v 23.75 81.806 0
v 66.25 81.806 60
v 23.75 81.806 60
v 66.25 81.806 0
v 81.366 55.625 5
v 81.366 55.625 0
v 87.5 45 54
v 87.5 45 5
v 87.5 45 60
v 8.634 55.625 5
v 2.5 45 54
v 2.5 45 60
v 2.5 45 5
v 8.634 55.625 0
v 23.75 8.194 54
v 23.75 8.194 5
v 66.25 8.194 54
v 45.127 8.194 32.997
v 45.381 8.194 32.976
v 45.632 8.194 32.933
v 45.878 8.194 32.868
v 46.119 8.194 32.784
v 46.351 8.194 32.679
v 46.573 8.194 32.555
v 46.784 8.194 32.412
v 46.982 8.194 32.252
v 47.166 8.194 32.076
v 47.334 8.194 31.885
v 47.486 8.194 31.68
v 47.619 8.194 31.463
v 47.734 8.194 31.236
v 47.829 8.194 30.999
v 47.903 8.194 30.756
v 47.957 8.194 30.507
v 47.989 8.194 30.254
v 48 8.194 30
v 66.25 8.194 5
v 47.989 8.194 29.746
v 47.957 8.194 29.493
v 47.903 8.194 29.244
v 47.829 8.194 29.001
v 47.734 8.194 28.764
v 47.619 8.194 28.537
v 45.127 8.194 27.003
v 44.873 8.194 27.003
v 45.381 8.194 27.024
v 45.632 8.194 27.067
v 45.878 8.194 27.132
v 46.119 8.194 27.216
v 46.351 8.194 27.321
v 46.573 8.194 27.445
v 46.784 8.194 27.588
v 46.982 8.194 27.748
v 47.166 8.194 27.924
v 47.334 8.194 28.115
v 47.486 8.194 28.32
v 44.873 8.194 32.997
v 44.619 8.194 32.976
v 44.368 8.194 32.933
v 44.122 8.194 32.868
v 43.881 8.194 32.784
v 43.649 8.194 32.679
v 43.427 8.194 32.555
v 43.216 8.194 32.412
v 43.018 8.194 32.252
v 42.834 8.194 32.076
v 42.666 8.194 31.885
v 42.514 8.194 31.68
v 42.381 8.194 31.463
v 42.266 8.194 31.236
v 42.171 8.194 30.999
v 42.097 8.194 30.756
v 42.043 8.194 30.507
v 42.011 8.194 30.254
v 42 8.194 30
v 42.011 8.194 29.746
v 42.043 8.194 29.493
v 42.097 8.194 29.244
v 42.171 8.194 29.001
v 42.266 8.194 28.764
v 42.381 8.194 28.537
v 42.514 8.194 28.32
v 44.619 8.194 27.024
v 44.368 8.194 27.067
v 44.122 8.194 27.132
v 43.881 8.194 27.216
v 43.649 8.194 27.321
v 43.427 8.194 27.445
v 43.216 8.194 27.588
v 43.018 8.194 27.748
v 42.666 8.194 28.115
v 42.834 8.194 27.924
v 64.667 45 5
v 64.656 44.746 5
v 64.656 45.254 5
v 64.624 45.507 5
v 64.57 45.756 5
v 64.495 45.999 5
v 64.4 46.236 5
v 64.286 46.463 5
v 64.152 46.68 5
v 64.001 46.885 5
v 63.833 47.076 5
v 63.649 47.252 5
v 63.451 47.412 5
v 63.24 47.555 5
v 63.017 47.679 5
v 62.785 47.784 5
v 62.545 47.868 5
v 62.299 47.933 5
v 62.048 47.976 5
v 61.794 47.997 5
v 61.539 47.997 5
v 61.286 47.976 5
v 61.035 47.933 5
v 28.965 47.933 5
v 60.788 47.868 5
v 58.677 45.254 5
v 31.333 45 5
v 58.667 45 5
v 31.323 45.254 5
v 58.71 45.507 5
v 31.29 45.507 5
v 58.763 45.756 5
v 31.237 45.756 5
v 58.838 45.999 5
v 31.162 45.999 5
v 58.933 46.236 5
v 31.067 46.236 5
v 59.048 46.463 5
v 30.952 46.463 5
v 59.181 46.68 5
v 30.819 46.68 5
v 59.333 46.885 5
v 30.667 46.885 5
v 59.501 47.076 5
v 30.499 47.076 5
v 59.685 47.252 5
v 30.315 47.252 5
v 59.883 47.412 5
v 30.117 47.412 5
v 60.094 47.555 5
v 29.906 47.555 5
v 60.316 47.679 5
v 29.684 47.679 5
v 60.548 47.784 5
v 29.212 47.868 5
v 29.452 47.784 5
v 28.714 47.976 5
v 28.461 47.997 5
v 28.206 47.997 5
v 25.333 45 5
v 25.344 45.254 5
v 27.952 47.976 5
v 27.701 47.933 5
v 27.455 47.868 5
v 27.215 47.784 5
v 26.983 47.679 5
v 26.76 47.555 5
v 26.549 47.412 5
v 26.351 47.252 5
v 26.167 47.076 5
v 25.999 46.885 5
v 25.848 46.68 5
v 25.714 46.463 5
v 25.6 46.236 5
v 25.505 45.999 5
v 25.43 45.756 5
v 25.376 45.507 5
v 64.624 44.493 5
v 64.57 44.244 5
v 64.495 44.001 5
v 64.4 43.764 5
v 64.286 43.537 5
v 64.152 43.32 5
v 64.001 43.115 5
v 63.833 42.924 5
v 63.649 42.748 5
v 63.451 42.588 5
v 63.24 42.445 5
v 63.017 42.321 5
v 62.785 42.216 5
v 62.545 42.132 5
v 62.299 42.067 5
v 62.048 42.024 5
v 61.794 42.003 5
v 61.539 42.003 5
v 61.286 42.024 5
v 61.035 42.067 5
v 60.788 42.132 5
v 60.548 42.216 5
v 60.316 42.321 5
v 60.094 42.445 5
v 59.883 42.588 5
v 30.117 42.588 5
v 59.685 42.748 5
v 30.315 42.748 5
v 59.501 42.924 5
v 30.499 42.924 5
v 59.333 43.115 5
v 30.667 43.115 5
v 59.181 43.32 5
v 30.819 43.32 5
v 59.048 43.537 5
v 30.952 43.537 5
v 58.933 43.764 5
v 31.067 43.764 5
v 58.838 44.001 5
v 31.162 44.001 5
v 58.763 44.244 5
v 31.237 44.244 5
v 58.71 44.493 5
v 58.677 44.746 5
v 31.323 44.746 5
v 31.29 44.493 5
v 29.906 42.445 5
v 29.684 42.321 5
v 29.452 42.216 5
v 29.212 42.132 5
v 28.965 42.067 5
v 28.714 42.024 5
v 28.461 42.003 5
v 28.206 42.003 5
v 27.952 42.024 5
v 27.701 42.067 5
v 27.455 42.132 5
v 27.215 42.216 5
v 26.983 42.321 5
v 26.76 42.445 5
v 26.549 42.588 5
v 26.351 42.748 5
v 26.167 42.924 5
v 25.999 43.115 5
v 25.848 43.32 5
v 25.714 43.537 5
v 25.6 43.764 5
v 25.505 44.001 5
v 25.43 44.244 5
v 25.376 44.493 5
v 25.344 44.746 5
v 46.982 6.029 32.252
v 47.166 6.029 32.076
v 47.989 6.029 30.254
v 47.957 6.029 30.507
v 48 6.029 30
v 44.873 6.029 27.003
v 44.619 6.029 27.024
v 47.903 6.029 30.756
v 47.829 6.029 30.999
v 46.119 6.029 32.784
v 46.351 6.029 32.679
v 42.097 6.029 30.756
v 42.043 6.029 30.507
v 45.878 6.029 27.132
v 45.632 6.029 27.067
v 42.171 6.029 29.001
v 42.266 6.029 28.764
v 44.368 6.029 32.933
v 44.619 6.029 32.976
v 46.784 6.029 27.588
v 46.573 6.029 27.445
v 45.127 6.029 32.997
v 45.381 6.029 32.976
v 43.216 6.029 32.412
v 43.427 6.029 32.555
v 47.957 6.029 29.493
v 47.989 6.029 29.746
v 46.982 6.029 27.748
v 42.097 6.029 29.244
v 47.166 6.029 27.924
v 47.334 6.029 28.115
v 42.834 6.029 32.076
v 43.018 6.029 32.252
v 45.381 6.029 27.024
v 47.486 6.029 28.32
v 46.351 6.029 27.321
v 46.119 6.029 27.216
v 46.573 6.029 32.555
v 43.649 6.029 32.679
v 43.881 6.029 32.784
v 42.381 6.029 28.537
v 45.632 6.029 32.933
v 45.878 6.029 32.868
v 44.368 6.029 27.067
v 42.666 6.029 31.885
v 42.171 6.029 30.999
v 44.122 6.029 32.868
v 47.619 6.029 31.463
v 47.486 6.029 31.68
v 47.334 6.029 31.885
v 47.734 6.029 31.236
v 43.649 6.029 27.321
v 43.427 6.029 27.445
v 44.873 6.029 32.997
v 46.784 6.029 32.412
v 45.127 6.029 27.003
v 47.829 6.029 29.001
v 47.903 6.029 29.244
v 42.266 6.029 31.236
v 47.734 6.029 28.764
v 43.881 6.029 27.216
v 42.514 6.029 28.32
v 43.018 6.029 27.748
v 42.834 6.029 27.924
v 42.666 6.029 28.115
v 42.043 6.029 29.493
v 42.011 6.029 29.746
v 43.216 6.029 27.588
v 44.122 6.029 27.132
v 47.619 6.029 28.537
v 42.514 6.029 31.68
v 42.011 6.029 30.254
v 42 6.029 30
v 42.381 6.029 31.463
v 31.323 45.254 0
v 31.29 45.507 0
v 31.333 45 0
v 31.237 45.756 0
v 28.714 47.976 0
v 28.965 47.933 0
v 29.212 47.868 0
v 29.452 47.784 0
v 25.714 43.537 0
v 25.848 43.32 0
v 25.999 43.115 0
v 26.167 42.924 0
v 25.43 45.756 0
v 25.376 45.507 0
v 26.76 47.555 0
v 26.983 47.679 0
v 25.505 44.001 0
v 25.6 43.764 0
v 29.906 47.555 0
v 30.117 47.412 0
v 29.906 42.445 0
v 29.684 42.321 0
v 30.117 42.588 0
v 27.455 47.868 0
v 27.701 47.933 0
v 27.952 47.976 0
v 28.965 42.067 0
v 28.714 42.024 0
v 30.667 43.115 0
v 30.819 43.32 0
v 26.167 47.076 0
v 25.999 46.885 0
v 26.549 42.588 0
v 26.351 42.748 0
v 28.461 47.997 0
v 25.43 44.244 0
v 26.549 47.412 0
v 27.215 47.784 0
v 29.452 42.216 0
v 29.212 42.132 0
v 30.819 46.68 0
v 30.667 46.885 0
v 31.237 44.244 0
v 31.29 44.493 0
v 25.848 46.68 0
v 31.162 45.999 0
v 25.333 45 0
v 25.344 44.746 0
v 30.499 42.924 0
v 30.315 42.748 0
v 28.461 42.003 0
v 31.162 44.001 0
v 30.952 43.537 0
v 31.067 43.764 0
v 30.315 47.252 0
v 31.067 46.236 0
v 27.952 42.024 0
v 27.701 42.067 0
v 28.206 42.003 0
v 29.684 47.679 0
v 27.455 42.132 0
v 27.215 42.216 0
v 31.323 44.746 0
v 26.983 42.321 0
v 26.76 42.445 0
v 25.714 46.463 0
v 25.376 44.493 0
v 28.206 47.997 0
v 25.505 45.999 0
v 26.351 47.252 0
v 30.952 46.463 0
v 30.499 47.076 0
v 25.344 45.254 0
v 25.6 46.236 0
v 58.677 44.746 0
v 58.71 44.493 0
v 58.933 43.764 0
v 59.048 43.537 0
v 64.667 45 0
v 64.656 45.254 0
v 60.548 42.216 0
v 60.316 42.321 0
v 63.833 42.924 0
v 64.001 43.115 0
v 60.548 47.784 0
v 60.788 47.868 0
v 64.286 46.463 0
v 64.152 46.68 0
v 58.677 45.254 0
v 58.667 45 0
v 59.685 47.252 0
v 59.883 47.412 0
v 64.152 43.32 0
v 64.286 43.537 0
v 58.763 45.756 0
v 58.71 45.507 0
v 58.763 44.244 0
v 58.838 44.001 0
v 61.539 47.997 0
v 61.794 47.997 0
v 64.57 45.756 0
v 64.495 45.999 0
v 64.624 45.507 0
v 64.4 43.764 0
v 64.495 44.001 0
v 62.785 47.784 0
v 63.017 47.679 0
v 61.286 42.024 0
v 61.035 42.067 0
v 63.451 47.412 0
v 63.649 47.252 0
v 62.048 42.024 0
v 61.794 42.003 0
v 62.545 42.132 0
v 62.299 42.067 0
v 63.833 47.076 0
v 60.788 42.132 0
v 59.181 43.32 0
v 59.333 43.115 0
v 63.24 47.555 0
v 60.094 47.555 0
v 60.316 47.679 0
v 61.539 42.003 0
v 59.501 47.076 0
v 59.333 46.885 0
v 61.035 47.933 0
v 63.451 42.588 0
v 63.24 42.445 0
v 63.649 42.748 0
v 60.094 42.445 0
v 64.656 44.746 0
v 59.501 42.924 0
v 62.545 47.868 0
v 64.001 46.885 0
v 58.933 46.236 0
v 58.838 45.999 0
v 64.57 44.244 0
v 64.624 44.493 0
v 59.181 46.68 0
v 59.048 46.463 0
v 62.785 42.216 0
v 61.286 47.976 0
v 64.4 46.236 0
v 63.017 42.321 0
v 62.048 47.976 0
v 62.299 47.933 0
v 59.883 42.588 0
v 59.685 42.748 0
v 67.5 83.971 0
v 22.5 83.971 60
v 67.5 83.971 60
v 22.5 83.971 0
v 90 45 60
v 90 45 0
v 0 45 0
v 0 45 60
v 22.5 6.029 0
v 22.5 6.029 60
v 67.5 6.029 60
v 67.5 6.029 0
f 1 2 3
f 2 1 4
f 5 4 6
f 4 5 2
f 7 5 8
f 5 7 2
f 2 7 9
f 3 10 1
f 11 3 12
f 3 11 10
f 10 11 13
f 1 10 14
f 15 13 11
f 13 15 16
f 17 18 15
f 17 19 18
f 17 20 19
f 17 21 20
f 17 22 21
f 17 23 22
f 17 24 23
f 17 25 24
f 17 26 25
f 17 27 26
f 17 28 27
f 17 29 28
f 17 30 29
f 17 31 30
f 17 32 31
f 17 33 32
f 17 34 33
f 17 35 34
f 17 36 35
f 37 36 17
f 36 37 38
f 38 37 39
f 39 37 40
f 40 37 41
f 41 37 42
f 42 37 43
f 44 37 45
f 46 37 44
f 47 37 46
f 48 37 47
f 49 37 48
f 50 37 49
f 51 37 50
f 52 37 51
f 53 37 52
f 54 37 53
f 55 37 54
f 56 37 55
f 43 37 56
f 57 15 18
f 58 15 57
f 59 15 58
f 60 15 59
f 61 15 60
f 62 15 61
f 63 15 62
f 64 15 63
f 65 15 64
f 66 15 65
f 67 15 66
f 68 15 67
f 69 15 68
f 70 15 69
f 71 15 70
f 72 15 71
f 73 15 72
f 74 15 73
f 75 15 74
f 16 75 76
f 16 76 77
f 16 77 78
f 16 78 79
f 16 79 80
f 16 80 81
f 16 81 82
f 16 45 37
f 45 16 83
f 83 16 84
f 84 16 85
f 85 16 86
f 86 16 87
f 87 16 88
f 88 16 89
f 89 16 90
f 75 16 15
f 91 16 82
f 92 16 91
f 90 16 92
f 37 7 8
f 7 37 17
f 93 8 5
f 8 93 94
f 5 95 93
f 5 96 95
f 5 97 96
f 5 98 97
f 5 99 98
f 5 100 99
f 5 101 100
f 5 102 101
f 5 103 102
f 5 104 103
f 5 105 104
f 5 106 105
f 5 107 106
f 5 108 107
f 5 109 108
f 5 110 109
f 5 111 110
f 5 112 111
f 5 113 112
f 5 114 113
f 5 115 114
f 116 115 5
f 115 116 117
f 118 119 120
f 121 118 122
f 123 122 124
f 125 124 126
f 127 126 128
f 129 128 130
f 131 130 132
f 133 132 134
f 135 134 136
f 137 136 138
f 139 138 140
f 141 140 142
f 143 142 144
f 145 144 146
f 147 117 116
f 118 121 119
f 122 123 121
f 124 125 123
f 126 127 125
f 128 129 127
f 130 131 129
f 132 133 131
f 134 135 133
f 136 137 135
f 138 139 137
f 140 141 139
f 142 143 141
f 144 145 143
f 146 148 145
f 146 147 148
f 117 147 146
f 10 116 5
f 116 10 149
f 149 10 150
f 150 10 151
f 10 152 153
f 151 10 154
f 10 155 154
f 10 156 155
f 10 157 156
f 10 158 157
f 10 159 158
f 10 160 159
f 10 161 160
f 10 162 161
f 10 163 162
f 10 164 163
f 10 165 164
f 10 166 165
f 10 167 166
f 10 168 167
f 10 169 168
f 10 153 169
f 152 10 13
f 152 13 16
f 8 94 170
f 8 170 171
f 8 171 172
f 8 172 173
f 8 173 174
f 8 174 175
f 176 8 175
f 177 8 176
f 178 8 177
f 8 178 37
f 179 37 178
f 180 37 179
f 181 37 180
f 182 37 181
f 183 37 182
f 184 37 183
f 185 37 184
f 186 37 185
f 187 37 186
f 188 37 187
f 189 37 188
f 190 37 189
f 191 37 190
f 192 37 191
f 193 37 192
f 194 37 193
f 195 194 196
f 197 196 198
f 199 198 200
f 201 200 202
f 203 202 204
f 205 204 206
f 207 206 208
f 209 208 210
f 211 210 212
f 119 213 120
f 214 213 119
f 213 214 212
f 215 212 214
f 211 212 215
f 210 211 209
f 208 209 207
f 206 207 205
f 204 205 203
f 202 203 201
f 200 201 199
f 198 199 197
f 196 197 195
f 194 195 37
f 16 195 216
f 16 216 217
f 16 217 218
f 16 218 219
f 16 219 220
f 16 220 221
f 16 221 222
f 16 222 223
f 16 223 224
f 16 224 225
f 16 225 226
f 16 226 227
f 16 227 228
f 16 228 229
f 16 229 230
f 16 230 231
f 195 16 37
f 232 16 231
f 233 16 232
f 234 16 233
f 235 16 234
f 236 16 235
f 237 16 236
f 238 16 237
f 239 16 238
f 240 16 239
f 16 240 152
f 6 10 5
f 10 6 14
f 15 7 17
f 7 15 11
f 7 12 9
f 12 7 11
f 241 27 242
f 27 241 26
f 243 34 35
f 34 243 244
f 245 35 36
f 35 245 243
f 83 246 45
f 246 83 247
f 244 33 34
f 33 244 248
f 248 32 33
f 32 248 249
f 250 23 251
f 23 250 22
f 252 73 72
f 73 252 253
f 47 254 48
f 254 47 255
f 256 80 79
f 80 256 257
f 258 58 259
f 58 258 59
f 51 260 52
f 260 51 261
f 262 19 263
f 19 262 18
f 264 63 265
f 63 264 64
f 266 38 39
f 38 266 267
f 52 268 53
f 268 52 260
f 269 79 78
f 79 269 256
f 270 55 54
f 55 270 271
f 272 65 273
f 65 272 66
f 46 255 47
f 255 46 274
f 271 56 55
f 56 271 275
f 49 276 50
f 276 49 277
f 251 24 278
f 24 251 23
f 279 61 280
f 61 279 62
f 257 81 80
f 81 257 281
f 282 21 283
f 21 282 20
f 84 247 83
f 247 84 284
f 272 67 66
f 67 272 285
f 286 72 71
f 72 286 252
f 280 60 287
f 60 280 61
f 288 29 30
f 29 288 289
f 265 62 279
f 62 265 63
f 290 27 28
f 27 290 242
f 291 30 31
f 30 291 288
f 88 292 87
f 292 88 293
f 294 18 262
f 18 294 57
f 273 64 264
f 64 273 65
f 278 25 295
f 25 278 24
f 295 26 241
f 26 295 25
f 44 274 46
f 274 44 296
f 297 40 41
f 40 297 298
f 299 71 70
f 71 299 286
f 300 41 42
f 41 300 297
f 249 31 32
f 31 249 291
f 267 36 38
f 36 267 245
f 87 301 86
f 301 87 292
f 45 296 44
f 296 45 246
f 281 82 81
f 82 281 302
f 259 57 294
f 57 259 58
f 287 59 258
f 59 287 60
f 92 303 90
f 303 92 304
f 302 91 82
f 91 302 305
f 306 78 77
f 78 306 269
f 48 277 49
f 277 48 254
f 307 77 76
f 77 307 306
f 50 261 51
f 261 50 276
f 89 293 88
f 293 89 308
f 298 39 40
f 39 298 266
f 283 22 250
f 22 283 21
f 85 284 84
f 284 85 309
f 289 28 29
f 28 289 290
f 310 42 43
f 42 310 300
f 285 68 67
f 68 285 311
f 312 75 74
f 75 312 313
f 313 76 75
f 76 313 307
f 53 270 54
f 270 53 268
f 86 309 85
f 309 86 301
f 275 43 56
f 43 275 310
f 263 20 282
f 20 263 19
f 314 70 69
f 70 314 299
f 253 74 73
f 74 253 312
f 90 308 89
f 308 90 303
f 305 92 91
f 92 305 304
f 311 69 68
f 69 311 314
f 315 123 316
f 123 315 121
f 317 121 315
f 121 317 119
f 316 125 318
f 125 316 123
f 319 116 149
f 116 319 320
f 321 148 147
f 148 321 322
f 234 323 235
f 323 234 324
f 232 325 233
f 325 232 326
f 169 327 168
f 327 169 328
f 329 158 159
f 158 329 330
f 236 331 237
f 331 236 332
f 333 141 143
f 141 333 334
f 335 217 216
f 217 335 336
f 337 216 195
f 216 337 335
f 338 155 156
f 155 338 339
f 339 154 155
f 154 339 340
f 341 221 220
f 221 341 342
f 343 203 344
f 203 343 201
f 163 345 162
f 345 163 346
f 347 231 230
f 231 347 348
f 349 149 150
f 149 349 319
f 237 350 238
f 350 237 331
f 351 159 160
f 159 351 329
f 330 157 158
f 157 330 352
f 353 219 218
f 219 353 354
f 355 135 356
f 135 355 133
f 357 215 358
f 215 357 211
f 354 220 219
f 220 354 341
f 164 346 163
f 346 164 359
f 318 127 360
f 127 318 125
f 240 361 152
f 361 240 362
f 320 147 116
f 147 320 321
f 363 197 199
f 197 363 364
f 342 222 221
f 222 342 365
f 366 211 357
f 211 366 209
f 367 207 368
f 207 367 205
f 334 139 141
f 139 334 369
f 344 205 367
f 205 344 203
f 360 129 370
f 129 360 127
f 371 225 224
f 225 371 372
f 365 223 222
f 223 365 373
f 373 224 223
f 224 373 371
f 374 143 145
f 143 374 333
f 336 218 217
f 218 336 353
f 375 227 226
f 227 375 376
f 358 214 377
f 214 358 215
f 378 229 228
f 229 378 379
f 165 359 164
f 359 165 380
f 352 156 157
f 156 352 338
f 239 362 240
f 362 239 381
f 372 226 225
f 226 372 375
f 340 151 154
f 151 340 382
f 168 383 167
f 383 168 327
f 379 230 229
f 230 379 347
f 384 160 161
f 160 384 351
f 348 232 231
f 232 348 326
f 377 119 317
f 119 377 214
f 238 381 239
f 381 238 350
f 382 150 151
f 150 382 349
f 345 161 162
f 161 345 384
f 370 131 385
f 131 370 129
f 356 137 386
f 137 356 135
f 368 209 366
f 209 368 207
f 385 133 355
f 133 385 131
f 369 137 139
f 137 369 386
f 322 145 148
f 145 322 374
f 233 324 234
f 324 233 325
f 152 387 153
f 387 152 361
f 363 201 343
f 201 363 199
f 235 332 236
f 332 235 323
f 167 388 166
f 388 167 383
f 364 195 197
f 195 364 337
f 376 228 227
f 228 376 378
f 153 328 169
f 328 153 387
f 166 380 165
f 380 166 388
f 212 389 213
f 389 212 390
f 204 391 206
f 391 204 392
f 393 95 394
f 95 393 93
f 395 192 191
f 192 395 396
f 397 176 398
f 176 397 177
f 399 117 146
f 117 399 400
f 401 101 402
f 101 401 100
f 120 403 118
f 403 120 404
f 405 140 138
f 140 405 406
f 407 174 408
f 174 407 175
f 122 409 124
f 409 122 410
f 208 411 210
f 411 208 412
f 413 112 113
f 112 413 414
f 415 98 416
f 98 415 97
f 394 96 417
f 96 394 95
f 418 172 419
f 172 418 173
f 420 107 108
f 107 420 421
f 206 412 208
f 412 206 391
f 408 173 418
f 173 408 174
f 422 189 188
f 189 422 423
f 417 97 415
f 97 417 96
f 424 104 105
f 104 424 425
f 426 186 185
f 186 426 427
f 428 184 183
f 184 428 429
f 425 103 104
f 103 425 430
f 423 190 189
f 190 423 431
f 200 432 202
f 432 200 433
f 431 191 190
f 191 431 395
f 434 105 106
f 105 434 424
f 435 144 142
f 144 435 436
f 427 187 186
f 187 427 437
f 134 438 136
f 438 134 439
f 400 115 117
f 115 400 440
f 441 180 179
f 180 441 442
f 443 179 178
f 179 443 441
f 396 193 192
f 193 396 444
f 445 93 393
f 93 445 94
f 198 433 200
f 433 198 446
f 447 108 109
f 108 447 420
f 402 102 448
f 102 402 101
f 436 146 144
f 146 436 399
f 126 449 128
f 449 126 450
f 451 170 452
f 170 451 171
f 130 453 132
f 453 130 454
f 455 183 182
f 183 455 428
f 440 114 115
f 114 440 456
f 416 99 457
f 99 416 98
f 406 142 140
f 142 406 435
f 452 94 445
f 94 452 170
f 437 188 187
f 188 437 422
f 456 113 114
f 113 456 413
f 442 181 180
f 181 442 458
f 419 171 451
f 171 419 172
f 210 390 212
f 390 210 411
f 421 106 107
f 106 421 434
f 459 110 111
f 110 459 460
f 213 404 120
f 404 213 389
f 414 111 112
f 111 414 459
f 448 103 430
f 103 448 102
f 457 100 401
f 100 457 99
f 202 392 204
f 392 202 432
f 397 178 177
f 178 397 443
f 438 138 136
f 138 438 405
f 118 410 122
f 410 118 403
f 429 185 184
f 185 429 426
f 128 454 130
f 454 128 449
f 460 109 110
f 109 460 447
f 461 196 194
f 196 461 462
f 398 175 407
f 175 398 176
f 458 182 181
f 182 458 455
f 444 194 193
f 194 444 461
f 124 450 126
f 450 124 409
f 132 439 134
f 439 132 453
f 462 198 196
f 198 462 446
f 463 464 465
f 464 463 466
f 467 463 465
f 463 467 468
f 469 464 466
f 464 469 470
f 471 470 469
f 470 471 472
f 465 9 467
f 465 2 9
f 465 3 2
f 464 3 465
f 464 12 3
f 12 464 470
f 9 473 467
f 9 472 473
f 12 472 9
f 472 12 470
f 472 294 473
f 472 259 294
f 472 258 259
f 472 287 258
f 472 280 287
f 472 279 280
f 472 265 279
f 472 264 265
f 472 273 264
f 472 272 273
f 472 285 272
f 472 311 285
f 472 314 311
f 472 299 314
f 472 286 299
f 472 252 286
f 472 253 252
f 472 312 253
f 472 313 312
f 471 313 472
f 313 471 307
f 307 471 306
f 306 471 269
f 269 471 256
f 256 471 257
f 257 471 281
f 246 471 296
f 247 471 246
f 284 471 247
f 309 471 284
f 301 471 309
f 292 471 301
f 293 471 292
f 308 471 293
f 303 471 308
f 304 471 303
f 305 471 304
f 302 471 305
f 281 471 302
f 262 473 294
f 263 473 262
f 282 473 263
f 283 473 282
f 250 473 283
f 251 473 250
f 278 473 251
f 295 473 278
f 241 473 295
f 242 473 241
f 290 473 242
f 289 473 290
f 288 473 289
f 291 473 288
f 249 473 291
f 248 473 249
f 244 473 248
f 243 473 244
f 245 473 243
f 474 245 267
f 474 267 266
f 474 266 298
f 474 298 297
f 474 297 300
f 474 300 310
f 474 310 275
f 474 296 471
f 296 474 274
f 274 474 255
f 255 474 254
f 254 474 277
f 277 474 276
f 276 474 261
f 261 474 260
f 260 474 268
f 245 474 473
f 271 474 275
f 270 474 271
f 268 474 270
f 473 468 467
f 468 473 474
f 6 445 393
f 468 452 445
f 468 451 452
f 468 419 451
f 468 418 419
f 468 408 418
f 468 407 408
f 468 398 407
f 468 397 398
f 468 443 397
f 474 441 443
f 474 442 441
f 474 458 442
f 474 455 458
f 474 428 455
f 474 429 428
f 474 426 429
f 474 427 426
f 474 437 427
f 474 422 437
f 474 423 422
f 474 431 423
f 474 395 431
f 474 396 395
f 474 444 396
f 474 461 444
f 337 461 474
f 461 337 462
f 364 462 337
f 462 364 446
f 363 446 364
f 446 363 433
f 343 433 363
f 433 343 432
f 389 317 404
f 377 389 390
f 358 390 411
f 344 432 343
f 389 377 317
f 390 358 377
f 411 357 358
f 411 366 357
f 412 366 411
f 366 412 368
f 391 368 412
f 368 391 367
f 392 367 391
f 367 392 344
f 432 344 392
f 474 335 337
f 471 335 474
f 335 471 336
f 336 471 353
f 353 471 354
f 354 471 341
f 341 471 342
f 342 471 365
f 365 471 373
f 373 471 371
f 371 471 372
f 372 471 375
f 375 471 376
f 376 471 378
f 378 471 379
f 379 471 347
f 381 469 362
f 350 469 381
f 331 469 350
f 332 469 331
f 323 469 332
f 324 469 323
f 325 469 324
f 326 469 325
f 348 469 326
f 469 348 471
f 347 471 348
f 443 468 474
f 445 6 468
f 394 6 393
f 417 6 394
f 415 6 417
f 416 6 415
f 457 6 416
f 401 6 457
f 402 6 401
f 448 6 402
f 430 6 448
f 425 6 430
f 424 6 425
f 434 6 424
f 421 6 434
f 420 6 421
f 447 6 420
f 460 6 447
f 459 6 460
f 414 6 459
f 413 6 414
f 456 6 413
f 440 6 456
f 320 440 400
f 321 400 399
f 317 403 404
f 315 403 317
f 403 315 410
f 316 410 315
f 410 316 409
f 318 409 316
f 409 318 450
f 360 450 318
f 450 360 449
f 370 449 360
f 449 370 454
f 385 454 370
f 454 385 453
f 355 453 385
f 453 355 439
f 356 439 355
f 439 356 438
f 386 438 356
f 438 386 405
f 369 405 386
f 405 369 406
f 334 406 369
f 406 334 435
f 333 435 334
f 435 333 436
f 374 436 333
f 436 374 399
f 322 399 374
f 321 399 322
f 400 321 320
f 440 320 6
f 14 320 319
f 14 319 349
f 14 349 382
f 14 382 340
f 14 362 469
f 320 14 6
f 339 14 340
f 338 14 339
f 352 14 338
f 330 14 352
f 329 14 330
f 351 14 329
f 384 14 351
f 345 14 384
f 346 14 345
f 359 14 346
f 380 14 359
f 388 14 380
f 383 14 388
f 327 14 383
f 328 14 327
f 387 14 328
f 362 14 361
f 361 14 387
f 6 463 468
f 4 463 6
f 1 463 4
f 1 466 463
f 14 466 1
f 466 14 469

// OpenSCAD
////////////
x= 90;
z = 60;
hoyo_agua = 6; // diametro
/////////////
hoyos = 6; // diametro
dist_pared =5;

/////////////

dim_2 = x-dist_pared;
dis_2 = dist_pared/ 2;


j = dim_2/ 3 ;
k=dim_2/8;


p1 = [x/2,(x/2),0];
p2 = [x/2,(x/2),-1];

/////////cubo bace 
c1x =dim_2;
c1y =(dim_2/2)+k ;//-3
c1z = dist_pared+2;
p3 = [dis_2,dis_2,-2];
/////////cubo altura
c2x =dim_2;
c2y =(dim_2/2);
c2z = dist_pared+3;
p4 = [dis_2,dis_2,z-dist_pared-1];

z2c = z /2;
p5 = [(x/2),(x/2),(z/2)]; // (z/2)

p6=[j,x/2,-2];
p7=[x-j,x/2,-2];

$fn = 74;

module f_C()
{
    difference()
    {
translate(p2)
    color("blue")
cylinder(h = z+2 ,d =dim_2,$fn =6);
    
translate(p3)
    color("red")
cube([c1x,c1y,c1z]);
    
translate(p4)
    color("red")
cube([c2x,c2y,c2z]);
    }
    
    
  translate(p5)
   rotate([90,0,0])
  cylinder(h =(x/2), d=hoyo_agua  );  
  
  translate(p6)  
  cylinder(h =z/2, d=hoyos  ); 
   
   translate(p7)  
  cylinder(h =z/2, d=hoyos  ); 
  
}

difference()
{
translate(p1)
cylinder(h = z ,d =x,$fn =6);
f_C();
}


//text1 = "opcion ";
//fond
